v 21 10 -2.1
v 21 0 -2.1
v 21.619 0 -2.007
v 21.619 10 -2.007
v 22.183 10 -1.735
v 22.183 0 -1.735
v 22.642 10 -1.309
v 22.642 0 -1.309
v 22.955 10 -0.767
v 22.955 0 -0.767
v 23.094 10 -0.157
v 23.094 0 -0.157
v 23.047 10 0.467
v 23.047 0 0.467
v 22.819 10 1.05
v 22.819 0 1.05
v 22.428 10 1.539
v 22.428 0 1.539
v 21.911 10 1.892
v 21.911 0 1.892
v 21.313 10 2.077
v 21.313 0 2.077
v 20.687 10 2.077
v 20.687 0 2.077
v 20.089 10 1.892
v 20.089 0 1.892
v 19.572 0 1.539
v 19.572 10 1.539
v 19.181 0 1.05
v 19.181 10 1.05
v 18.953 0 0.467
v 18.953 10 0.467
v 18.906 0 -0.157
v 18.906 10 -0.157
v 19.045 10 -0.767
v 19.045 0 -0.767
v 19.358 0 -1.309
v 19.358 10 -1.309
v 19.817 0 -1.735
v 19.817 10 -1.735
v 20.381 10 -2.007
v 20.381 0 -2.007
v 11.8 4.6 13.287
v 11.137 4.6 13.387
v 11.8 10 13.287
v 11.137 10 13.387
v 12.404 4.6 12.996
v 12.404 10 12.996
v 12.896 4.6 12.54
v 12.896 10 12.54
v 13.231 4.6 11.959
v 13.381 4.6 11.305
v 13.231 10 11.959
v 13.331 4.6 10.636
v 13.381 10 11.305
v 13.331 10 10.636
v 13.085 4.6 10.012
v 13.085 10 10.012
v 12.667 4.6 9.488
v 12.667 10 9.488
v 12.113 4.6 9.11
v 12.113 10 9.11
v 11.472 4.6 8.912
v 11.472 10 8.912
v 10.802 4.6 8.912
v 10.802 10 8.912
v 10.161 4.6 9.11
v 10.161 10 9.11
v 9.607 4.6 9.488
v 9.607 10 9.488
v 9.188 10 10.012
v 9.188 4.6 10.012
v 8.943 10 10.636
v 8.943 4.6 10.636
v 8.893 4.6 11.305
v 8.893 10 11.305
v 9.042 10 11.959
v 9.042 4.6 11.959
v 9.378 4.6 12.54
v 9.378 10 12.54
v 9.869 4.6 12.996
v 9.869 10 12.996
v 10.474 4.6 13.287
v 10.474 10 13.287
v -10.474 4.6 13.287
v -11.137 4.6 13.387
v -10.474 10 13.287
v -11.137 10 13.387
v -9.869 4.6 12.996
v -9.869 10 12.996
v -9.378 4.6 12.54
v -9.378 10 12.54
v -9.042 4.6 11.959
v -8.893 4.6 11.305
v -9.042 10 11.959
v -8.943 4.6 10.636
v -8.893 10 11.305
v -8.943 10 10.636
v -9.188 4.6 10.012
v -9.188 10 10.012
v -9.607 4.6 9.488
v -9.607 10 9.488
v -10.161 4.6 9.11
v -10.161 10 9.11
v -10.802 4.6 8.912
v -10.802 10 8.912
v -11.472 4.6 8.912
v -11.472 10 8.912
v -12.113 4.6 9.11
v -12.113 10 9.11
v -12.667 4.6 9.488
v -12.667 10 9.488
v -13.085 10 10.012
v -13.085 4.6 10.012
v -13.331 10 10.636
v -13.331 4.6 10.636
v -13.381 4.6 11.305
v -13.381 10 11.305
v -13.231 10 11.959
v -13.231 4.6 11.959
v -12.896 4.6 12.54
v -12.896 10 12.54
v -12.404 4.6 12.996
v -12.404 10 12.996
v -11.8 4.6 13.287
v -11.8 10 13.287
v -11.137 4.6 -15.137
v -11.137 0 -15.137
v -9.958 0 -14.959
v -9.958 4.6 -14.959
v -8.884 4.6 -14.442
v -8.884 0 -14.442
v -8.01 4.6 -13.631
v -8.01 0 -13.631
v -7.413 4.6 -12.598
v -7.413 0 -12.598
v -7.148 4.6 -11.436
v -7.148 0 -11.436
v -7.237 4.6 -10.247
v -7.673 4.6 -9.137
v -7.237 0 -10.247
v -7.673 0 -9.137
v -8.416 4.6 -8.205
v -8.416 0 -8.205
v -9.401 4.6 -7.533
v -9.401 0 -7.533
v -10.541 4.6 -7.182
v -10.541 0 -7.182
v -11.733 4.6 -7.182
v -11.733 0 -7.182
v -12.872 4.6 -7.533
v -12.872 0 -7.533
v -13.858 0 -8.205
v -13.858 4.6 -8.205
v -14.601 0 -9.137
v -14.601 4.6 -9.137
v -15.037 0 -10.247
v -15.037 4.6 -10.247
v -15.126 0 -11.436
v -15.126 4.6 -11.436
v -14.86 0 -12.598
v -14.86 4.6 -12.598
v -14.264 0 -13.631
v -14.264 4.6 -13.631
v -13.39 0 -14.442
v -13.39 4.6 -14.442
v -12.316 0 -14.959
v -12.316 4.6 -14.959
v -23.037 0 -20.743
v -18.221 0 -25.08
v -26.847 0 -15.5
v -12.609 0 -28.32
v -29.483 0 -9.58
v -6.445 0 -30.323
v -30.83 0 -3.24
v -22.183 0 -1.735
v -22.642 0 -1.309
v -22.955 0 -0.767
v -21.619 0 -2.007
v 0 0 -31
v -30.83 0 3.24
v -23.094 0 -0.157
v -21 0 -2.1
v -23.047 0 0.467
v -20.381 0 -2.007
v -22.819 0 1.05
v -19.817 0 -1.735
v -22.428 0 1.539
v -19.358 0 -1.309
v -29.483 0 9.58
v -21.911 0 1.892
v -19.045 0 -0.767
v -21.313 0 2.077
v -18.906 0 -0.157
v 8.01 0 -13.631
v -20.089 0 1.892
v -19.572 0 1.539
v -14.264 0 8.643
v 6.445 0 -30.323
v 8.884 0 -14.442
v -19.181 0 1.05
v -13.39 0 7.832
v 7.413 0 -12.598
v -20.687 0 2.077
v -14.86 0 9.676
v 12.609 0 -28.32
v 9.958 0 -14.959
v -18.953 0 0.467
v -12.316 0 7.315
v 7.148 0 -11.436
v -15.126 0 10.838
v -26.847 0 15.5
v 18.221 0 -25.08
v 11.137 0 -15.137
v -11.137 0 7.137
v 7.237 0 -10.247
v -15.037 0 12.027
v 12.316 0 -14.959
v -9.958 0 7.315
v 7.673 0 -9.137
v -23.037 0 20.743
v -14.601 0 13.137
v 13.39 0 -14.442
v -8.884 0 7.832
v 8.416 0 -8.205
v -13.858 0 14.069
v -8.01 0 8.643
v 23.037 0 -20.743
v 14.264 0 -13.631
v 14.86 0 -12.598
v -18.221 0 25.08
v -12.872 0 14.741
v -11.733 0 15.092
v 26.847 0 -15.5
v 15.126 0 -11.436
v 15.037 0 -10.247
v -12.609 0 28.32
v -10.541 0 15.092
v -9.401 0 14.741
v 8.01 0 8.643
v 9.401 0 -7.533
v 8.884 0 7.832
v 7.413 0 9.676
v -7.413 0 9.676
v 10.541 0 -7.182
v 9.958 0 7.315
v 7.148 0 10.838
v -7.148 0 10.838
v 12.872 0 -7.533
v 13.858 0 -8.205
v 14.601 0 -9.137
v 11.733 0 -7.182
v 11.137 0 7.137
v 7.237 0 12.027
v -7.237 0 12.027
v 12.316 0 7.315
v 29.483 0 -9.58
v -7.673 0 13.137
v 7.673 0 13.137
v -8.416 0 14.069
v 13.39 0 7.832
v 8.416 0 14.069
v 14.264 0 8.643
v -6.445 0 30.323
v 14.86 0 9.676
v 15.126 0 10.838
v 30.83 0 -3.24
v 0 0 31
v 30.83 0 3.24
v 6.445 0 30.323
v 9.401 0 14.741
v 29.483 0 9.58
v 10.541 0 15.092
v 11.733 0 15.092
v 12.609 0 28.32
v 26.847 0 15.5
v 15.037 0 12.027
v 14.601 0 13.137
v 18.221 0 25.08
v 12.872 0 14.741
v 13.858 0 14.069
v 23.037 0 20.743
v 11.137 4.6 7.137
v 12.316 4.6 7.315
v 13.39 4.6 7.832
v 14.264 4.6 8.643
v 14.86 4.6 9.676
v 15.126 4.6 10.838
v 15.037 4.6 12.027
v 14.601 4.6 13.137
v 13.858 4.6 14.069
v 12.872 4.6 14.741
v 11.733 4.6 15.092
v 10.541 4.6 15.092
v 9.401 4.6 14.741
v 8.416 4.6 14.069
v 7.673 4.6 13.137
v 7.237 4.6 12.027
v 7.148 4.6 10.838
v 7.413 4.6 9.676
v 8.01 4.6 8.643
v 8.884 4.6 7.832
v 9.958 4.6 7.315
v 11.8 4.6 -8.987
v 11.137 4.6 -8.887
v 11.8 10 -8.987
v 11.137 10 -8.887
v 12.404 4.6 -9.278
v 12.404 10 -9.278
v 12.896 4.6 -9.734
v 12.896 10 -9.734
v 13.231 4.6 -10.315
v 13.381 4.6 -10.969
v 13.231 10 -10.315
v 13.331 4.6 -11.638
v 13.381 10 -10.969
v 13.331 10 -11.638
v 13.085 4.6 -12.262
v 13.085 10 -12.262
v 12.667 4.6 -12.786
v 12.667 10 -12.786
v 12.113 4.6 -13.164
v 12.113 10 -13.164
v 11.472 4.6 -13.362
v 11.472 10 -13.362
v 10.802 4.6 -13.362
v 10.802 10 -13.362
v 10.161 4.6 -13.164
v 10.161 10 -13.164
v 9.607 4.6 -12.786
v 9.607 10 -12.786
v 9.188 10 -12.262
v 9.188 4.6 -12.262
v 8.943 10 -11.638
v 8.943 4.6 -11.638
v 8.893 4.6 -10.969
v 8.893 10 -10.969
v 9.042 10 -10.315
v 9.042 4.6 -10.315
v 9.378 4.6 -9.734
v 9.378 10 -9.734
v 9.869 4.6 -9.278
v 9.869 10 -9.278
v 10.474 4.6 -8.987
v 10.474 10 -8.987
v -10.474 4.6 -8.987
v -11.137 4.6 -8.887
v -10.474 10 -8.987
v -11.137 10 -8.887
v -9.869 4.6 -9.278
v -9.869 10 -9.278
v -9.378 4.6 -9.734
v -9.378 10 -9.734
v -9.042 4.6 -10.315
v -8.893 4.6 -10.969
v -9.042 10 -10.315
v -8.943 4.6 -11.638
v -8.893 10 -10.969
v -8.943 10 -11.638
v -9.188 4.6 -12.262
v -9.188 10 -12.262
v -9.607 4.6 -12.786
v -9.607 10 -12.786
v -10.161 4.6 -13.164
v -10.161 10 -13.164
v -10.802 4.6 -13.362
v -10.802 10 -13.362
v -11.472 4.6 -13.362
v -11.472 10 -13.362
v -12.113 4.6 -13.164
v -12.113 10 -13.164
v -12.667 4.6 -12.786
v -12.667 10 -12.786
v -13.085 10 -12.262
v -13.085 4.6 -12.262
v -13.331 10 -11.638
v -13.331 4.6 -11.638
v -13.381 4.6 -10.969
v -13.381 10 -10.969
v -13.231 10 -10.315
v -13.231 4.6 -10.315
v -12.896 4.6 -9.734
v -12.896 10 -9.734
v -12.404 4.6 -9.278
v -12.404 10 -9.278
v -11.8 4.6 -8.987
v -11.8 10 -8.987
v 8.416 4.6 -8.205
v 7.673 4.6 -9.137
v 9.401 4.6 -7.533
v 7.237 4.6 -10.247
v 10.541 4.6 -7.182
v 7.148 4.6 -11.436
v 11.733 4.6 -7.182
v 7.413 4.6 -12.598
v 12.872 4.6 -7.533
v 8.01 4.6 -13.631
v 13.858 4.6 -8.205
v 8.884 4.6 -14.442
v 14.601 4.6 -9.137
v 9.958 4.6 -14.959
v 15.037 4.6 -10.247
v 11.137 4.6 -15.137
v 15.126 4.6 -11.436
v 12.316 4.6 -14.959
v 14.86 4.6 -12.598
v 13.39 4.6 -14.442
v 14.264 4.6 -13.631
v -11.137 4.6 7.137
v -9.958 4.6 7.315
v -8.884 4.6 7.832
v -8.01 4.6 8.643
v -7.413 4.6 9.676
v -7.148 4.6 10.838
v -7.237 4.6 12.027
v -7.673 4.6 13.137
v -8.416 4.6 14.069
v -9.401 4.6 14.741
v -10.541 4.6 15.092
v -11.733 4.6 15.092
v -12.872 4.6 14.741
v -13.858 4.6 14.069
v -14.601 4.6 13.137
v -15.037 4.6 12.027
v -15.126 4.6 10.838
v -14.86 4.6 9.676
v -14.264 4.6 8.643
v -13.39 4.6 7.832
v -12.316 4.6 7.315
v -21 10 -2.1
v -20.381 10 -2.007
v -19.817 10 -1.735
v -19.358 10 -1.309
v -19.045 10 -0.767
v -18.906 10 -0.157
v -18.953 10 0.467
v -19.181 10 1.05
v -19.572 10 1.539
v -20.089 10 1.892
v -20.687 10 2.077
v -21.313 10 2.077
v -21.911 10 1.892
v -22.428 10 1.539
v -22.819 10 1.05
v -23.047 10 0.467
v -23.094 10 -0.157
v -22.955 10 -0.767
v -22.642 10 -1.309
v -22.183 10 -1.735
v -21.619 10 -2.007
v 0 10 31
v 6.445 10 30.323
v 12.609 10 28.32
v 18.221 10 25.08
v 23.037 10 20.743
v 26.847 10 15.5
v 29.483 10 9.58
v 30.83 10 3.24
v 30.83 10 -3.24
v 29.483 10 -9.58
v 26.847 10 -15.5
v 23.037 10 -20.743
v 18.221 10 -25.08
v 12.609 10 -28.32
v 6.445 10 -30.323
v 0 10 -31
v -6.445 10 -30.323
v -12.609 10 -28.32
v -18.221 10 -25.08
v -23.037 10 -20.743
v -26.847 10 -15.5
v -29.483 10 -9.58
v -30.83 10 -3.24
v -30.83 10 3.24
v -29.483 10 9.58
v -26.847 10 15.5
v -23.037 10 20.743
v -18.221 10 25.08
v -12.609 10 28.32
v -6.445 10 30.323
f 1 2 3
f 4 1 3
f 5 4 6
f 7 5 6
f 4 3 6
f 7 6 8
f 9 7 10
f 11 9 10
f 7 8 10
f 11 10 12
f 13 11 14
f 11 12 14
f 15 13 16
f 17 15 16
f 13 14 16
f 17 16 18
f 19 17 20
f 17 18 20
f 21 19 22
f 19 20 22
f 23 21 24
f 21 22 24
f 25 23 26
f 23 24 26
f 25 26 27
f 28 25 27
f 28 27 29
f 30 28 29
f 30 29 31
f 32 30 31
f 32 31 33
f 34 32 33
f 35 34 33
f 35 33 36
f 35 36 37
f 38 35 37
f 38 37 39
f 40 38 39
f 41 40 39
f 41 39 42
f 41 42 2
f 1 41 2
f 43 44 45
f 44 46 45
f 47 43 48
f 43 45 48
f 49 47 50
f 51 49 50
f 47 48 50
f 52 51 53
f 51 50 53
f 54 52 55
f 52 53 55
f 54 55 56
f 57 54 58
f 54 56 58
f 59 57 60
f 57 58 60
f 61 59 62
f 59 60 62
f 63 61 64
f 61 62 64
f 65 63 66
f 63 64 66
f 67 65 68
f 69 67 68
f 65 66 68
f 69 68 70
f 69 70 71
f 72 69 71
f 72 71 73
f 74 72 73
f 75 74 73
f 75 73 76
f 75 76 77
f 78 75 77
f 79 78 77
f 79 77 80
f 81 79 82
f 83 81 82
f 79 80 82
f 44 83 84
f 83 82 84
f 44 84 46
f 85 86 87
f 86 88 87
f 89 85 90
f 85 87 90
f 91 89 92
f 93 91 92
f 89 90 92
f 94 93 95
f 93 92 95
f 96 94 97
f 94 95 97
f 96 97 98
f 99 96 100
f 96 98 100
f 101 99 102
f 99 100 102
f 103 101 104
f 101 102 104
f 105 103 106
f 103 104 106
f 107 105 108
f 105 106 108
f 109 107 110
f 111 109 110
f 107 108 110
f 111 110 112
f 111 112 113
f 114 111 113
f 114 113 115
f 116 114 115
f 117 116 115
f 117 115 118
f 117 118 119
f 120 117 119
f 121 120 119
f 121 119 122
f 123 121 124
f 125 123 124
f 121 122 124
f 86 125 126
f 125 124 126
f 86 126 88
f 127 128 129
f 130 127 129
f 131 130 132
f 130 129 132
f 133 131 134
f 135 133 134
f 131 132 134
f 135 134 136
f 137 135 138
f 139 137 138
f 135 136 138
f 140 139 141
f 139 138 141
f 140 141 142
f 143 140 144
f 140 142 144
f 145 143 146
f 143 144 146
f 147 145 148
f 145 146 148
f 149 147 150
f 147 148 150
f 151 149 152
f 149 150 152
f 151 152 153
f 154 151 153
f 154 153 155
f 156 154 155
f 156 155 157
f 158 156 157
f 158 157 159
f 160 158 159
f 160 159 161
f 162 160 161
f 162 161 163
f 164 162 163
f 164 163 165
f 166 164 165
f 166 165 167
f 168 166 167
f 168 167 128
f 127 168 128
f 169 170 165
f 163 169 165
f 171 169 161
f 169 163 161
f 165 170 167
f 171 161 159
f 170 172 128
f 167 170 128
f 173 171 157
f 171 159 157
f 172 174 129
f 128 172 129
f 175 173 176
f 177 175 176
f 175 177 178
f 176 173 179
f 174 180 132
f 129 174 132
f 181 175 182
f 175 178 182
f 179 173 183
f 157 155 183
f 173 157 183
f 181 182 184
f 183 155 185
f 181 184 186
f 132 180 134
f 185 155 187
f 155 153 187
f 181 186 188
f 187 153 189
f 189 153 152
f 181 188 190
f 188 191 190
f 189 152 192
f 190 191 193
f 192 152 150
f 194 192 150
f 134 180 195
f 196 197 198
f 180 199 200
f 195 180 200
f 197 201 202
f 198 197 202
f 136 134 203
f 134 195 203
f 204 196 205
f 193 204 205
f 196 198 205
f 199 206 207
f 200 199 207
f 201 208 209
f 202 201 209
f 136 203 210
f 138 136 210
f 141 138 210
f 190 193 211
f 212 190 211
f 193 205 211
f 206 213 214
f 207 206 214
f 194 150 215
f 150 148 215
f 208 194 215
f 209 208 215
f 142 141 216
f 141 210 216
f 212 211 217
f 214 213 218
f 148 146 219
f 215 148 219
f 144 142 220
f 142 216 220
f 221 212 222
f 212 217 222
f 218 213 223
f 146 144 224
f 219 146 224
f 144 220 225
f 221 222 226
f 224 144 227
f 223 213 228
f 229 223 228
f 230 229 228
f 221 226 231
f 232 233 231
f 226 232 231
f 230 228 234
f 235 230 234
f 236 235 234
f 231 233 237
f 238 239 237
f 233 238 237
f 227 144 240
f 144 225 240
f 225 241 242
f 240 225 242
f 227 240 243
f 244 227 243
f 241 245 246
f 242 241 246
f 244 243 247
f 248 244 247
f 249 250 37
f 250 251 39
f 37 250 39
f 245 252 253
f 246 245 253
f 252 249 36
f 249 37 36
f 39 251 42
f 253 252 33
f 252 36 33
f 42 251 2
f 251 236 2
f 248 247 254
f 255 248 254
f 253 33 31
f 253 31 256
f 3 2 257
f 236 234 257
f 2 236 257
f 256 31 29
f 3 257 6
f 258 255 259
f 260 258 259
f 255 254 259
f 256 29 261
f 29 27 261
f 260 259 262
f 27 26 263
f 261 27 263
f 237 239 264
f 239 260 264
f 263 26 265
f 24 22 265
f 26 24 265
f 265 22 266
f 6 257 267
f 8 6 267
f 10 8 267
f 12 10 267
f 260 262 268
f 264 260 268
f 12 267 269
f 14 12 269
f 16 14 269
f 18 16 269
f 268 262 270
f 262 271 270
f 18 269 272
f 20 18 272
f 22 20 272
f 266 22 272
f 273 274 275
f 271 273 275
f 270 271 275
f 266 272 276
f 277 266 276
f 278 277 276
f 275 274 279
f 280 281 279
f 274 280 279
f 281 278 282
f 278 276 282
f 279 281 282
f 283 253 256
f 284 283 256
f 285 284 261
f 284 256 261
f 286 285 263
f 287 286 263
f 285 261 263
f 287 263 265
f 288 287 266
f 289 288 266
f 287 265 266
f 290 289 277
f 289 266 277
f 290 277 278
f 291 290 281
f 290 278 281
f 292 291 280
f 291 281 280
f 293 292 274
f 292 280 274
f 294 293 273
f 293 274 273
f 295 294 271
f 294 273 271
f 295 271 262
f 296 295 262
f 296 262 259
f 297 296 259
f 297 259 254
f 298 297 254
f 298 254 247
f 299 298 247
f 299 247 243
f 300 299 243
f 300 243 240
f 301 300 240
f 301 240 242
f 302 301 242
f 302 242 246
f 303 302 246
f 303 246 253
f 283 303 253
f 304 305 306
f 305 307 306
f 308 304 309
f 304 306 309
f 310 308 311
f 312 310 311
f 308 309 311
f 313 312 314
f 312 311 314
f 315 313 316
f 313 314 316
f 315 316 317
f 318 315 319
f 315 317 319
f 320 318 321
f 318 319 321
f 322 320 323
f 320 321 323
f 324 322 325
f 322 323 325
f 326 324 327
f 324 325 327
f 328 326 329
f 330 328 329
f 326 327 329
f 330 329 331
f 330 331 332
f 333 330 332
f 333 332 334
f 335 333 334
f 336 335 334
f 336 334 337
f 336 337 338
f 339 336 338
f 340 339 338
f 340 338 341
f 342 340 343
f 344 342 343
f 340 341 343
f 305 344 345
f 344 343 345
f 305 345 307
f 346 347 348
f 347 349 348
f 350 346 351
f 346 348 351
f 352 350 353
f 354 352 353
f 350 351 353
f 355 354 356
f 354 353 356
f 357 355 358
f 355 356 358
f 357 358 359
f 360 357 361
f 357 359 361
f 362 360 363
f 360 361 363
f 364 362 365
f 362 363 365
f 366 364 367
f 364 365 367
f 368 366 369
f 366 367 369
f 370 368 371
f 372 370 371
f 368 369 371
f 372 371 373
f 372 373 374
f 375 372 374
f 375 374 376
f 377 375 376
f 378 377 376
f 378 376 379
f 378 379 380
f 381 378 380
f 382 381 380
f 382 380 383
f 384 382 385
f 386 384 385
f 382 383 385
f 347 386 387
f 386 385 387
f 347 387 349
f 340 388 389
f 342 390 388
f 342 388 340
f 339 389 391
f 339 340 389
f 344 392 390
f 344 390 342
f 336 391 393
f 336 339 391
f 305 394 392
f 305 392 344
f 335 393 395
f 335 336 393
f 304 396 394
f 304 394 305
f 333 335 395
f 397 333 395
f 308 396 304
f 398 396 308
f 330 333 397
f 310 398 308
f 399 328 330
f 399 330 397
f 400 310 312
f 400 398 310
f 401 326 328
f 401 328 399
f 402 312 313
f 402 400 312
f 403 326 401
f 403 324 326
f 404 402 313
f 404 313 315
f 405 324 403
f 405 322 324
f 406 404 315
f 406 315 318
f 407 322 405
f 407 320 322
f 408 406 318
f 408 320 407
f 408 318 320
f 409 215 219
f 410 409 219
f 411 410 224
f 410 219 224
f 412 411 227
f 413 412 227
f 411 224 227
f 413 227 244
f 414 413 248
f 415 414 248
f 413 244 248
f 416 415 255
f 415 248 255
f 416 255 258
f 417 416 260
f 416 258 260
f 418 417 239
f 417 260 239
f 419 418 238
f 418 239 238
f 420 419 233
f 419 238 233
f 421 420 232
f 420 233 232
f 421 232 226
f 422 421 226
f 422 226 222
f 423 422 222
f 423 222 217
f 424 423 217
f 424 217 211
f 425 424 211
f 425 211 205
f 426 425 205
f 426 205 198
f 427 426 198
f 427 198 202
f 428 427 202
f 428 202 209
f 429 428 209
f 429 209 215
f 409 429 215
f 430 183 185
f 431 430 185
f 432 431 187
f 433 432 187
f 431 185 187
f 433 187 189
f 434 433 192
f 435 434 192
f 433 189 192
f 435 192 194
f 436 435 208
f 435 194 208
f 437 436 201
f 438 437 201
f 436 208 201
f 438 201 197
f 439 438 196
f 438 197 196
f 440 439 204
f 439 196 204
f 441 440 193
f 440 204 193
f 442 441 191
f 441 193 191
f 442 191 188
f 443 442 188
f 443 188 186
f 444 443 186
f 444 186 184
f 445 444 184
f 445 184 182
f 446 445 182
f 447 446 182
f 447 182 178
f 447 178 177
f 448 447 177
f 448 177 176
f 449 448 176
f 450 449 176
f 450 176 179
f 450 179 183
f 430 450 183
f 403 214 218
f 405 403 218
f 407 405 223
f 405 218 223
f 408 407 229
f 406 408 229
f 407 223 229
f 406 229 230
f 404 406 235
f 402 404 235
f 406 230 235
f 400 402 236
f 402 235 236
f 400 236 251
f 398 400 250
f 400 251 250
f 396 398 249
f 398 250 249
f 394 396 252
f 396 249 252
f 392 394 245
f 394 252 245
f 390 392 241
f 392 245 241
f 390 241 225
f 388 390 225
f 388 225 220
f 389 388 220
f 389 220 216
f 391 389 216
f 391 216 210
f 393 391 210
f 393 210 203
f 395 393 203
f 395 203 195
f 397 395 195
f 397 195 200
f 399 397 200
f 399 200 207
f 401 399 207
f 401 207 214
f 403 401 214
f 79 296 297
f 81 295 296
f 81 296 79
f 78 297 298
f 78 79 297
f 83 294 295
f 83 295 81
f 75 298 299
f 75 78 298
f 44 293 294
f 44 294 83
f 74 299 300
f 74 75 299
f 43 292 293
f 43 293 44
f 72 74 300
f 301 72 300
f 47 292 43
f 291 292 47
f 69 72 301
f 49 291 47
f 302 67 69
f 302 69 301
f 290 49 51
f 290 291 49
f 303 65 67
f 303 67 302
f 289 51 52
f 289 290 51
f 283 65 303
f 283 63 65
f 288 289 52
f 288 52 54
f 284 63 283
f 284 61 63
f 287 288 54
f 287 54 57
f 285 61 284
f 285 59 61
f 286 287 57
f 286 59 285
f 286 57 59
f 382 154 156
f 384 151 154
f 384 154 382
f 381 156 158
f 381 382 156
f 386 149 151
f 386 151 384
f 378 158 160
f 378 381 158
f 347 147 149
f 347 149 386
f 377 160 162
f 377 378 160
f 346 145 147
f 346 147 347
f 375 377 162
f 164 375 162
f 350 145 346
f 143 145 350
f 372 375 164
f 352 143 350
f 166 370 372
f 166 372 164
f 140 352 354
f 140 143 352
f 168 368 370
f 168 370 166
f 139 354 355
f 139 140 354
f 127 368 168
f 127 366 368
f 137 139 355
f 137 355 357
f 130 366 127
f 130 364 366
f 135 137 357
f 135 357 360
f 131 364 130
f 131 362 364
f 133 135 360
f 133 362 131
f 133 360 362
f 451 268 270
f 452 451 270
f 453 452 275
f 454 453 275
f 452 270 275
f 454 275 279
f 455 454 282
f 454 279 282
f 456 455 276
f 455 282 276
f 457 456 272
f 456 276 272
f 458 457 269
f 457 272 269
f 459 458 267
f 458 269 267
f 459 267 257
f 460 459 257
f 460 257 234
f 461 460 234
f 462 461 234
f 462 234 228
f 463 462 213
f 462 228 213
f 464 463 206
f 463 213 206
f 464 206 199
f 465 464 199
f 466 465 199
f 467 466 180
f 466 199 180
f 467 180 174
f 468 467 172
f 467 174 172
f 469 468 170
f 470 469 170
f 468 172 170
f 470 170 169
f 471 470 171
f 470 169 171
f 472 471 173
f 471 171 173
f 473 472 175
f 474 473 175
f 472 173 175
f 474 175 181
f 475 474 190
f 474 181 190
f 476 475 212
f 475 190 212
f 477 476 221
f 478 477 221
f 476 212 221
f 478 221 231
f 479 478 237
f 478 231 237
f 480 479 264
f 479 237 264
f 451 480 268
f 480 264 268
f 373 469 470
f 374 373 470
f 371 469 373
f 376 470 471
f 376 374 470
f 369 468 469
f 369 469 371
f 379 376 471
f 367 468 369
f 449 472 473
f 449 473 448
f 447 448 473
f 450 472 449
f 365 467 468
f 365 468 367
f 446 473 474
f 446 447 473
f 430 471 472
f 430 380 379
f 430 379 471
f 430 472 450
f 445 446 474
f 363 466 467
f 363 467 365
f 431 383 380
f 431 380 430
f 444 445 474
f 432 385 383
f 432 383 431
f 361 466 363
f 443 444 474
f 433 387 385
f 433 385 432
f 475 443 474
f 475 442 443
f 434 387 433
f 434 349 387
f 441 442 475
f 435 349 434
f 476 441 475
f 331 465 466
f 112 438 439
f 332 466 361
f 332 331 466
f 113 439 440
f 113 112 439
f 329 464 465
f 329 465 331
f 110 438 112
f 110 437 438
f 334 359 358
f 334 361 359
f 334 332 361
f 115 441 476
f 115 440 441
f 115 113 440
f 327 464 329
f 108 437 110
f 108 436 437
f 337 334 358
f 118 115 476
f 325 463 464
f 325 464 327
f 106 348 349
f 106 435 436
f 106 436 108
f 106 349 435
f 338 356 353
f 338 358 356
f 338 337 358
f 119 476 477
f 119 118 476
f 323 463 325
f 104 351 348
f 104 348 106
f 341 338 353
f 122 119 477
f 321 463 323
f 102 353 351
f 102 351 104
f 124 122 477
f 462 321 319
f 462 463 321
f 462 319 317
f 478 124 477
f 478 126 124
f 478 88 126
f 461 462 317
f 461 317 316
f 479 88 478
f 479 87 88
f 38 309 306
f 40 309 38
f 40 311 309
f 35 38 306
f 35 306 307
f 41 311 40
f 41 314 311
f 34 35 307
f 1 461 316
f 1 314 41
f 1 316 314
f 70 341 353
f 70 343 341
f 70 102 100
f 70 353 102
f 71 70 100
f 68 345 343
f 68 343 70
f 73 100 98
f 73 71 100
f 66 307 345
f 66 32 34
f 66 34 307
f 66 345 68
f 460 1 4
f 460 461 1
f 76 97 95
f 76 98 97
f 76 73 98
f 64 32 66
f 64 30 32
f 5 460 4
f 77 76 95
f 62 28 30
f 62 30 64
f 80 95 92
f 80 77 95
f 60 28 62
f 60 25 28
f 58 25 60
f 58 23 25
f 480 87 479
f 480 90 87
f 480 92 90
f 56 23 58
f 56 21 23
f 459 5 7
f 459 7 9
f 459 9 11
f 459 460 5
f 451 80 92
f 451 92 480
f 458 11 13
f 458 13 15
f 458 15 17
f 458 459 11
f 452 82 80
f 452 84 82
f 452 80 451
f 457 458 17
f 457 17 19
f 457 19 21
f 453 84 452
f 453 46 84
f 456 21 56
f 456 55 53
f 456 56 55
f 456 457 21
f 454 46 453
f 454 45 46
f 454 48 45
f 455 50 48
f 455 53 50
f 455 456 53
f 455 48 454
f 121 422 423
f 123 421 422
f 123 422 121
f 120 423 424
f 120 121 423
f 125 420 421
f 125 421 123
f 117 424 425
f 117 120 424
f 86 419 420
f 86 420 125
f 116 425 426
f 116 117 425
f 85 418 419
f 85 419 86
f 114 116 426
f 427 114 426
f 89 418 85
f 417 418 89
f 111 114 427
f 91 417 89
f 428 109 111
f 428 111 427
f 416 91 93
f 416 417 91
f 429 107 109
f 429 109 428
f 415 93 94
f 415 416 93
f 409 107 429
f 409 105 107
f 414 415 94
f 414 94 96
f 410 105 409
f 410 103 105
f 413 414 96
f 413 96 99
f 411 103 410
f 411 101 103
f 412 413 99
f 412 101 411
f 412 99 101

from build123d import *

# Parameters (mm, degrees)
SKETCH_1_R                = 31
EXTRUDE_1_DEPTH           = 10
HOLE_WIZARD_M5_2_D        = 4.2
HOLE_WIZARD_2_D           = 4.5
HOLE_WIZARD_2_CBORE_D     = 8
HOLE_WIZARD_2_CBORE_DEPTH = 4.6


with BuildPart() as part:
    # 草图1 → 凸台-拉伸1 (new body)
    with BuildSketch(Plane(origin=(0, 0, 0), x_dir=(1, 0, 0), z_dir=(0, 1, 0))):
        with Locations(Location((0, 0, 0), (0, 0, 270))):
            Circle(SKETCH_1_R)
    extrude(amount=EXTRUDE_1_DEPTH)

    # M5 螺纹孔2 (through all)
    with Locations(Plane(origin=(-21, 10, 0), x_dir=(0, 0, 1), z_dir=(0, 1, 0))):
        with Locations((0, 0), (0, 42)):
            Hole(HOLE_WIZARD_M5_2_D / 2)

    # 打孔尺寸(%根据)内六角圆柱头螺钉的类型2 (through all)
    with Locations(Plane(origin=(-11.136931804, 0, 11.136931804), x_dir=(0, 0, -1), z_dir=(0, -1, 0))):
        with Locations((0, 0), (0, 22.273863608), (22.273863608, 22.273863608), (22.273863608, 0)):
            CounterBoreHole(HOLE_WIZARD_2_D / 2, HOLE_WIZARD_2_CBORE_D / 2, HOLE_WIZARD_2_CBORE_DEPTH)


solid = part.part
